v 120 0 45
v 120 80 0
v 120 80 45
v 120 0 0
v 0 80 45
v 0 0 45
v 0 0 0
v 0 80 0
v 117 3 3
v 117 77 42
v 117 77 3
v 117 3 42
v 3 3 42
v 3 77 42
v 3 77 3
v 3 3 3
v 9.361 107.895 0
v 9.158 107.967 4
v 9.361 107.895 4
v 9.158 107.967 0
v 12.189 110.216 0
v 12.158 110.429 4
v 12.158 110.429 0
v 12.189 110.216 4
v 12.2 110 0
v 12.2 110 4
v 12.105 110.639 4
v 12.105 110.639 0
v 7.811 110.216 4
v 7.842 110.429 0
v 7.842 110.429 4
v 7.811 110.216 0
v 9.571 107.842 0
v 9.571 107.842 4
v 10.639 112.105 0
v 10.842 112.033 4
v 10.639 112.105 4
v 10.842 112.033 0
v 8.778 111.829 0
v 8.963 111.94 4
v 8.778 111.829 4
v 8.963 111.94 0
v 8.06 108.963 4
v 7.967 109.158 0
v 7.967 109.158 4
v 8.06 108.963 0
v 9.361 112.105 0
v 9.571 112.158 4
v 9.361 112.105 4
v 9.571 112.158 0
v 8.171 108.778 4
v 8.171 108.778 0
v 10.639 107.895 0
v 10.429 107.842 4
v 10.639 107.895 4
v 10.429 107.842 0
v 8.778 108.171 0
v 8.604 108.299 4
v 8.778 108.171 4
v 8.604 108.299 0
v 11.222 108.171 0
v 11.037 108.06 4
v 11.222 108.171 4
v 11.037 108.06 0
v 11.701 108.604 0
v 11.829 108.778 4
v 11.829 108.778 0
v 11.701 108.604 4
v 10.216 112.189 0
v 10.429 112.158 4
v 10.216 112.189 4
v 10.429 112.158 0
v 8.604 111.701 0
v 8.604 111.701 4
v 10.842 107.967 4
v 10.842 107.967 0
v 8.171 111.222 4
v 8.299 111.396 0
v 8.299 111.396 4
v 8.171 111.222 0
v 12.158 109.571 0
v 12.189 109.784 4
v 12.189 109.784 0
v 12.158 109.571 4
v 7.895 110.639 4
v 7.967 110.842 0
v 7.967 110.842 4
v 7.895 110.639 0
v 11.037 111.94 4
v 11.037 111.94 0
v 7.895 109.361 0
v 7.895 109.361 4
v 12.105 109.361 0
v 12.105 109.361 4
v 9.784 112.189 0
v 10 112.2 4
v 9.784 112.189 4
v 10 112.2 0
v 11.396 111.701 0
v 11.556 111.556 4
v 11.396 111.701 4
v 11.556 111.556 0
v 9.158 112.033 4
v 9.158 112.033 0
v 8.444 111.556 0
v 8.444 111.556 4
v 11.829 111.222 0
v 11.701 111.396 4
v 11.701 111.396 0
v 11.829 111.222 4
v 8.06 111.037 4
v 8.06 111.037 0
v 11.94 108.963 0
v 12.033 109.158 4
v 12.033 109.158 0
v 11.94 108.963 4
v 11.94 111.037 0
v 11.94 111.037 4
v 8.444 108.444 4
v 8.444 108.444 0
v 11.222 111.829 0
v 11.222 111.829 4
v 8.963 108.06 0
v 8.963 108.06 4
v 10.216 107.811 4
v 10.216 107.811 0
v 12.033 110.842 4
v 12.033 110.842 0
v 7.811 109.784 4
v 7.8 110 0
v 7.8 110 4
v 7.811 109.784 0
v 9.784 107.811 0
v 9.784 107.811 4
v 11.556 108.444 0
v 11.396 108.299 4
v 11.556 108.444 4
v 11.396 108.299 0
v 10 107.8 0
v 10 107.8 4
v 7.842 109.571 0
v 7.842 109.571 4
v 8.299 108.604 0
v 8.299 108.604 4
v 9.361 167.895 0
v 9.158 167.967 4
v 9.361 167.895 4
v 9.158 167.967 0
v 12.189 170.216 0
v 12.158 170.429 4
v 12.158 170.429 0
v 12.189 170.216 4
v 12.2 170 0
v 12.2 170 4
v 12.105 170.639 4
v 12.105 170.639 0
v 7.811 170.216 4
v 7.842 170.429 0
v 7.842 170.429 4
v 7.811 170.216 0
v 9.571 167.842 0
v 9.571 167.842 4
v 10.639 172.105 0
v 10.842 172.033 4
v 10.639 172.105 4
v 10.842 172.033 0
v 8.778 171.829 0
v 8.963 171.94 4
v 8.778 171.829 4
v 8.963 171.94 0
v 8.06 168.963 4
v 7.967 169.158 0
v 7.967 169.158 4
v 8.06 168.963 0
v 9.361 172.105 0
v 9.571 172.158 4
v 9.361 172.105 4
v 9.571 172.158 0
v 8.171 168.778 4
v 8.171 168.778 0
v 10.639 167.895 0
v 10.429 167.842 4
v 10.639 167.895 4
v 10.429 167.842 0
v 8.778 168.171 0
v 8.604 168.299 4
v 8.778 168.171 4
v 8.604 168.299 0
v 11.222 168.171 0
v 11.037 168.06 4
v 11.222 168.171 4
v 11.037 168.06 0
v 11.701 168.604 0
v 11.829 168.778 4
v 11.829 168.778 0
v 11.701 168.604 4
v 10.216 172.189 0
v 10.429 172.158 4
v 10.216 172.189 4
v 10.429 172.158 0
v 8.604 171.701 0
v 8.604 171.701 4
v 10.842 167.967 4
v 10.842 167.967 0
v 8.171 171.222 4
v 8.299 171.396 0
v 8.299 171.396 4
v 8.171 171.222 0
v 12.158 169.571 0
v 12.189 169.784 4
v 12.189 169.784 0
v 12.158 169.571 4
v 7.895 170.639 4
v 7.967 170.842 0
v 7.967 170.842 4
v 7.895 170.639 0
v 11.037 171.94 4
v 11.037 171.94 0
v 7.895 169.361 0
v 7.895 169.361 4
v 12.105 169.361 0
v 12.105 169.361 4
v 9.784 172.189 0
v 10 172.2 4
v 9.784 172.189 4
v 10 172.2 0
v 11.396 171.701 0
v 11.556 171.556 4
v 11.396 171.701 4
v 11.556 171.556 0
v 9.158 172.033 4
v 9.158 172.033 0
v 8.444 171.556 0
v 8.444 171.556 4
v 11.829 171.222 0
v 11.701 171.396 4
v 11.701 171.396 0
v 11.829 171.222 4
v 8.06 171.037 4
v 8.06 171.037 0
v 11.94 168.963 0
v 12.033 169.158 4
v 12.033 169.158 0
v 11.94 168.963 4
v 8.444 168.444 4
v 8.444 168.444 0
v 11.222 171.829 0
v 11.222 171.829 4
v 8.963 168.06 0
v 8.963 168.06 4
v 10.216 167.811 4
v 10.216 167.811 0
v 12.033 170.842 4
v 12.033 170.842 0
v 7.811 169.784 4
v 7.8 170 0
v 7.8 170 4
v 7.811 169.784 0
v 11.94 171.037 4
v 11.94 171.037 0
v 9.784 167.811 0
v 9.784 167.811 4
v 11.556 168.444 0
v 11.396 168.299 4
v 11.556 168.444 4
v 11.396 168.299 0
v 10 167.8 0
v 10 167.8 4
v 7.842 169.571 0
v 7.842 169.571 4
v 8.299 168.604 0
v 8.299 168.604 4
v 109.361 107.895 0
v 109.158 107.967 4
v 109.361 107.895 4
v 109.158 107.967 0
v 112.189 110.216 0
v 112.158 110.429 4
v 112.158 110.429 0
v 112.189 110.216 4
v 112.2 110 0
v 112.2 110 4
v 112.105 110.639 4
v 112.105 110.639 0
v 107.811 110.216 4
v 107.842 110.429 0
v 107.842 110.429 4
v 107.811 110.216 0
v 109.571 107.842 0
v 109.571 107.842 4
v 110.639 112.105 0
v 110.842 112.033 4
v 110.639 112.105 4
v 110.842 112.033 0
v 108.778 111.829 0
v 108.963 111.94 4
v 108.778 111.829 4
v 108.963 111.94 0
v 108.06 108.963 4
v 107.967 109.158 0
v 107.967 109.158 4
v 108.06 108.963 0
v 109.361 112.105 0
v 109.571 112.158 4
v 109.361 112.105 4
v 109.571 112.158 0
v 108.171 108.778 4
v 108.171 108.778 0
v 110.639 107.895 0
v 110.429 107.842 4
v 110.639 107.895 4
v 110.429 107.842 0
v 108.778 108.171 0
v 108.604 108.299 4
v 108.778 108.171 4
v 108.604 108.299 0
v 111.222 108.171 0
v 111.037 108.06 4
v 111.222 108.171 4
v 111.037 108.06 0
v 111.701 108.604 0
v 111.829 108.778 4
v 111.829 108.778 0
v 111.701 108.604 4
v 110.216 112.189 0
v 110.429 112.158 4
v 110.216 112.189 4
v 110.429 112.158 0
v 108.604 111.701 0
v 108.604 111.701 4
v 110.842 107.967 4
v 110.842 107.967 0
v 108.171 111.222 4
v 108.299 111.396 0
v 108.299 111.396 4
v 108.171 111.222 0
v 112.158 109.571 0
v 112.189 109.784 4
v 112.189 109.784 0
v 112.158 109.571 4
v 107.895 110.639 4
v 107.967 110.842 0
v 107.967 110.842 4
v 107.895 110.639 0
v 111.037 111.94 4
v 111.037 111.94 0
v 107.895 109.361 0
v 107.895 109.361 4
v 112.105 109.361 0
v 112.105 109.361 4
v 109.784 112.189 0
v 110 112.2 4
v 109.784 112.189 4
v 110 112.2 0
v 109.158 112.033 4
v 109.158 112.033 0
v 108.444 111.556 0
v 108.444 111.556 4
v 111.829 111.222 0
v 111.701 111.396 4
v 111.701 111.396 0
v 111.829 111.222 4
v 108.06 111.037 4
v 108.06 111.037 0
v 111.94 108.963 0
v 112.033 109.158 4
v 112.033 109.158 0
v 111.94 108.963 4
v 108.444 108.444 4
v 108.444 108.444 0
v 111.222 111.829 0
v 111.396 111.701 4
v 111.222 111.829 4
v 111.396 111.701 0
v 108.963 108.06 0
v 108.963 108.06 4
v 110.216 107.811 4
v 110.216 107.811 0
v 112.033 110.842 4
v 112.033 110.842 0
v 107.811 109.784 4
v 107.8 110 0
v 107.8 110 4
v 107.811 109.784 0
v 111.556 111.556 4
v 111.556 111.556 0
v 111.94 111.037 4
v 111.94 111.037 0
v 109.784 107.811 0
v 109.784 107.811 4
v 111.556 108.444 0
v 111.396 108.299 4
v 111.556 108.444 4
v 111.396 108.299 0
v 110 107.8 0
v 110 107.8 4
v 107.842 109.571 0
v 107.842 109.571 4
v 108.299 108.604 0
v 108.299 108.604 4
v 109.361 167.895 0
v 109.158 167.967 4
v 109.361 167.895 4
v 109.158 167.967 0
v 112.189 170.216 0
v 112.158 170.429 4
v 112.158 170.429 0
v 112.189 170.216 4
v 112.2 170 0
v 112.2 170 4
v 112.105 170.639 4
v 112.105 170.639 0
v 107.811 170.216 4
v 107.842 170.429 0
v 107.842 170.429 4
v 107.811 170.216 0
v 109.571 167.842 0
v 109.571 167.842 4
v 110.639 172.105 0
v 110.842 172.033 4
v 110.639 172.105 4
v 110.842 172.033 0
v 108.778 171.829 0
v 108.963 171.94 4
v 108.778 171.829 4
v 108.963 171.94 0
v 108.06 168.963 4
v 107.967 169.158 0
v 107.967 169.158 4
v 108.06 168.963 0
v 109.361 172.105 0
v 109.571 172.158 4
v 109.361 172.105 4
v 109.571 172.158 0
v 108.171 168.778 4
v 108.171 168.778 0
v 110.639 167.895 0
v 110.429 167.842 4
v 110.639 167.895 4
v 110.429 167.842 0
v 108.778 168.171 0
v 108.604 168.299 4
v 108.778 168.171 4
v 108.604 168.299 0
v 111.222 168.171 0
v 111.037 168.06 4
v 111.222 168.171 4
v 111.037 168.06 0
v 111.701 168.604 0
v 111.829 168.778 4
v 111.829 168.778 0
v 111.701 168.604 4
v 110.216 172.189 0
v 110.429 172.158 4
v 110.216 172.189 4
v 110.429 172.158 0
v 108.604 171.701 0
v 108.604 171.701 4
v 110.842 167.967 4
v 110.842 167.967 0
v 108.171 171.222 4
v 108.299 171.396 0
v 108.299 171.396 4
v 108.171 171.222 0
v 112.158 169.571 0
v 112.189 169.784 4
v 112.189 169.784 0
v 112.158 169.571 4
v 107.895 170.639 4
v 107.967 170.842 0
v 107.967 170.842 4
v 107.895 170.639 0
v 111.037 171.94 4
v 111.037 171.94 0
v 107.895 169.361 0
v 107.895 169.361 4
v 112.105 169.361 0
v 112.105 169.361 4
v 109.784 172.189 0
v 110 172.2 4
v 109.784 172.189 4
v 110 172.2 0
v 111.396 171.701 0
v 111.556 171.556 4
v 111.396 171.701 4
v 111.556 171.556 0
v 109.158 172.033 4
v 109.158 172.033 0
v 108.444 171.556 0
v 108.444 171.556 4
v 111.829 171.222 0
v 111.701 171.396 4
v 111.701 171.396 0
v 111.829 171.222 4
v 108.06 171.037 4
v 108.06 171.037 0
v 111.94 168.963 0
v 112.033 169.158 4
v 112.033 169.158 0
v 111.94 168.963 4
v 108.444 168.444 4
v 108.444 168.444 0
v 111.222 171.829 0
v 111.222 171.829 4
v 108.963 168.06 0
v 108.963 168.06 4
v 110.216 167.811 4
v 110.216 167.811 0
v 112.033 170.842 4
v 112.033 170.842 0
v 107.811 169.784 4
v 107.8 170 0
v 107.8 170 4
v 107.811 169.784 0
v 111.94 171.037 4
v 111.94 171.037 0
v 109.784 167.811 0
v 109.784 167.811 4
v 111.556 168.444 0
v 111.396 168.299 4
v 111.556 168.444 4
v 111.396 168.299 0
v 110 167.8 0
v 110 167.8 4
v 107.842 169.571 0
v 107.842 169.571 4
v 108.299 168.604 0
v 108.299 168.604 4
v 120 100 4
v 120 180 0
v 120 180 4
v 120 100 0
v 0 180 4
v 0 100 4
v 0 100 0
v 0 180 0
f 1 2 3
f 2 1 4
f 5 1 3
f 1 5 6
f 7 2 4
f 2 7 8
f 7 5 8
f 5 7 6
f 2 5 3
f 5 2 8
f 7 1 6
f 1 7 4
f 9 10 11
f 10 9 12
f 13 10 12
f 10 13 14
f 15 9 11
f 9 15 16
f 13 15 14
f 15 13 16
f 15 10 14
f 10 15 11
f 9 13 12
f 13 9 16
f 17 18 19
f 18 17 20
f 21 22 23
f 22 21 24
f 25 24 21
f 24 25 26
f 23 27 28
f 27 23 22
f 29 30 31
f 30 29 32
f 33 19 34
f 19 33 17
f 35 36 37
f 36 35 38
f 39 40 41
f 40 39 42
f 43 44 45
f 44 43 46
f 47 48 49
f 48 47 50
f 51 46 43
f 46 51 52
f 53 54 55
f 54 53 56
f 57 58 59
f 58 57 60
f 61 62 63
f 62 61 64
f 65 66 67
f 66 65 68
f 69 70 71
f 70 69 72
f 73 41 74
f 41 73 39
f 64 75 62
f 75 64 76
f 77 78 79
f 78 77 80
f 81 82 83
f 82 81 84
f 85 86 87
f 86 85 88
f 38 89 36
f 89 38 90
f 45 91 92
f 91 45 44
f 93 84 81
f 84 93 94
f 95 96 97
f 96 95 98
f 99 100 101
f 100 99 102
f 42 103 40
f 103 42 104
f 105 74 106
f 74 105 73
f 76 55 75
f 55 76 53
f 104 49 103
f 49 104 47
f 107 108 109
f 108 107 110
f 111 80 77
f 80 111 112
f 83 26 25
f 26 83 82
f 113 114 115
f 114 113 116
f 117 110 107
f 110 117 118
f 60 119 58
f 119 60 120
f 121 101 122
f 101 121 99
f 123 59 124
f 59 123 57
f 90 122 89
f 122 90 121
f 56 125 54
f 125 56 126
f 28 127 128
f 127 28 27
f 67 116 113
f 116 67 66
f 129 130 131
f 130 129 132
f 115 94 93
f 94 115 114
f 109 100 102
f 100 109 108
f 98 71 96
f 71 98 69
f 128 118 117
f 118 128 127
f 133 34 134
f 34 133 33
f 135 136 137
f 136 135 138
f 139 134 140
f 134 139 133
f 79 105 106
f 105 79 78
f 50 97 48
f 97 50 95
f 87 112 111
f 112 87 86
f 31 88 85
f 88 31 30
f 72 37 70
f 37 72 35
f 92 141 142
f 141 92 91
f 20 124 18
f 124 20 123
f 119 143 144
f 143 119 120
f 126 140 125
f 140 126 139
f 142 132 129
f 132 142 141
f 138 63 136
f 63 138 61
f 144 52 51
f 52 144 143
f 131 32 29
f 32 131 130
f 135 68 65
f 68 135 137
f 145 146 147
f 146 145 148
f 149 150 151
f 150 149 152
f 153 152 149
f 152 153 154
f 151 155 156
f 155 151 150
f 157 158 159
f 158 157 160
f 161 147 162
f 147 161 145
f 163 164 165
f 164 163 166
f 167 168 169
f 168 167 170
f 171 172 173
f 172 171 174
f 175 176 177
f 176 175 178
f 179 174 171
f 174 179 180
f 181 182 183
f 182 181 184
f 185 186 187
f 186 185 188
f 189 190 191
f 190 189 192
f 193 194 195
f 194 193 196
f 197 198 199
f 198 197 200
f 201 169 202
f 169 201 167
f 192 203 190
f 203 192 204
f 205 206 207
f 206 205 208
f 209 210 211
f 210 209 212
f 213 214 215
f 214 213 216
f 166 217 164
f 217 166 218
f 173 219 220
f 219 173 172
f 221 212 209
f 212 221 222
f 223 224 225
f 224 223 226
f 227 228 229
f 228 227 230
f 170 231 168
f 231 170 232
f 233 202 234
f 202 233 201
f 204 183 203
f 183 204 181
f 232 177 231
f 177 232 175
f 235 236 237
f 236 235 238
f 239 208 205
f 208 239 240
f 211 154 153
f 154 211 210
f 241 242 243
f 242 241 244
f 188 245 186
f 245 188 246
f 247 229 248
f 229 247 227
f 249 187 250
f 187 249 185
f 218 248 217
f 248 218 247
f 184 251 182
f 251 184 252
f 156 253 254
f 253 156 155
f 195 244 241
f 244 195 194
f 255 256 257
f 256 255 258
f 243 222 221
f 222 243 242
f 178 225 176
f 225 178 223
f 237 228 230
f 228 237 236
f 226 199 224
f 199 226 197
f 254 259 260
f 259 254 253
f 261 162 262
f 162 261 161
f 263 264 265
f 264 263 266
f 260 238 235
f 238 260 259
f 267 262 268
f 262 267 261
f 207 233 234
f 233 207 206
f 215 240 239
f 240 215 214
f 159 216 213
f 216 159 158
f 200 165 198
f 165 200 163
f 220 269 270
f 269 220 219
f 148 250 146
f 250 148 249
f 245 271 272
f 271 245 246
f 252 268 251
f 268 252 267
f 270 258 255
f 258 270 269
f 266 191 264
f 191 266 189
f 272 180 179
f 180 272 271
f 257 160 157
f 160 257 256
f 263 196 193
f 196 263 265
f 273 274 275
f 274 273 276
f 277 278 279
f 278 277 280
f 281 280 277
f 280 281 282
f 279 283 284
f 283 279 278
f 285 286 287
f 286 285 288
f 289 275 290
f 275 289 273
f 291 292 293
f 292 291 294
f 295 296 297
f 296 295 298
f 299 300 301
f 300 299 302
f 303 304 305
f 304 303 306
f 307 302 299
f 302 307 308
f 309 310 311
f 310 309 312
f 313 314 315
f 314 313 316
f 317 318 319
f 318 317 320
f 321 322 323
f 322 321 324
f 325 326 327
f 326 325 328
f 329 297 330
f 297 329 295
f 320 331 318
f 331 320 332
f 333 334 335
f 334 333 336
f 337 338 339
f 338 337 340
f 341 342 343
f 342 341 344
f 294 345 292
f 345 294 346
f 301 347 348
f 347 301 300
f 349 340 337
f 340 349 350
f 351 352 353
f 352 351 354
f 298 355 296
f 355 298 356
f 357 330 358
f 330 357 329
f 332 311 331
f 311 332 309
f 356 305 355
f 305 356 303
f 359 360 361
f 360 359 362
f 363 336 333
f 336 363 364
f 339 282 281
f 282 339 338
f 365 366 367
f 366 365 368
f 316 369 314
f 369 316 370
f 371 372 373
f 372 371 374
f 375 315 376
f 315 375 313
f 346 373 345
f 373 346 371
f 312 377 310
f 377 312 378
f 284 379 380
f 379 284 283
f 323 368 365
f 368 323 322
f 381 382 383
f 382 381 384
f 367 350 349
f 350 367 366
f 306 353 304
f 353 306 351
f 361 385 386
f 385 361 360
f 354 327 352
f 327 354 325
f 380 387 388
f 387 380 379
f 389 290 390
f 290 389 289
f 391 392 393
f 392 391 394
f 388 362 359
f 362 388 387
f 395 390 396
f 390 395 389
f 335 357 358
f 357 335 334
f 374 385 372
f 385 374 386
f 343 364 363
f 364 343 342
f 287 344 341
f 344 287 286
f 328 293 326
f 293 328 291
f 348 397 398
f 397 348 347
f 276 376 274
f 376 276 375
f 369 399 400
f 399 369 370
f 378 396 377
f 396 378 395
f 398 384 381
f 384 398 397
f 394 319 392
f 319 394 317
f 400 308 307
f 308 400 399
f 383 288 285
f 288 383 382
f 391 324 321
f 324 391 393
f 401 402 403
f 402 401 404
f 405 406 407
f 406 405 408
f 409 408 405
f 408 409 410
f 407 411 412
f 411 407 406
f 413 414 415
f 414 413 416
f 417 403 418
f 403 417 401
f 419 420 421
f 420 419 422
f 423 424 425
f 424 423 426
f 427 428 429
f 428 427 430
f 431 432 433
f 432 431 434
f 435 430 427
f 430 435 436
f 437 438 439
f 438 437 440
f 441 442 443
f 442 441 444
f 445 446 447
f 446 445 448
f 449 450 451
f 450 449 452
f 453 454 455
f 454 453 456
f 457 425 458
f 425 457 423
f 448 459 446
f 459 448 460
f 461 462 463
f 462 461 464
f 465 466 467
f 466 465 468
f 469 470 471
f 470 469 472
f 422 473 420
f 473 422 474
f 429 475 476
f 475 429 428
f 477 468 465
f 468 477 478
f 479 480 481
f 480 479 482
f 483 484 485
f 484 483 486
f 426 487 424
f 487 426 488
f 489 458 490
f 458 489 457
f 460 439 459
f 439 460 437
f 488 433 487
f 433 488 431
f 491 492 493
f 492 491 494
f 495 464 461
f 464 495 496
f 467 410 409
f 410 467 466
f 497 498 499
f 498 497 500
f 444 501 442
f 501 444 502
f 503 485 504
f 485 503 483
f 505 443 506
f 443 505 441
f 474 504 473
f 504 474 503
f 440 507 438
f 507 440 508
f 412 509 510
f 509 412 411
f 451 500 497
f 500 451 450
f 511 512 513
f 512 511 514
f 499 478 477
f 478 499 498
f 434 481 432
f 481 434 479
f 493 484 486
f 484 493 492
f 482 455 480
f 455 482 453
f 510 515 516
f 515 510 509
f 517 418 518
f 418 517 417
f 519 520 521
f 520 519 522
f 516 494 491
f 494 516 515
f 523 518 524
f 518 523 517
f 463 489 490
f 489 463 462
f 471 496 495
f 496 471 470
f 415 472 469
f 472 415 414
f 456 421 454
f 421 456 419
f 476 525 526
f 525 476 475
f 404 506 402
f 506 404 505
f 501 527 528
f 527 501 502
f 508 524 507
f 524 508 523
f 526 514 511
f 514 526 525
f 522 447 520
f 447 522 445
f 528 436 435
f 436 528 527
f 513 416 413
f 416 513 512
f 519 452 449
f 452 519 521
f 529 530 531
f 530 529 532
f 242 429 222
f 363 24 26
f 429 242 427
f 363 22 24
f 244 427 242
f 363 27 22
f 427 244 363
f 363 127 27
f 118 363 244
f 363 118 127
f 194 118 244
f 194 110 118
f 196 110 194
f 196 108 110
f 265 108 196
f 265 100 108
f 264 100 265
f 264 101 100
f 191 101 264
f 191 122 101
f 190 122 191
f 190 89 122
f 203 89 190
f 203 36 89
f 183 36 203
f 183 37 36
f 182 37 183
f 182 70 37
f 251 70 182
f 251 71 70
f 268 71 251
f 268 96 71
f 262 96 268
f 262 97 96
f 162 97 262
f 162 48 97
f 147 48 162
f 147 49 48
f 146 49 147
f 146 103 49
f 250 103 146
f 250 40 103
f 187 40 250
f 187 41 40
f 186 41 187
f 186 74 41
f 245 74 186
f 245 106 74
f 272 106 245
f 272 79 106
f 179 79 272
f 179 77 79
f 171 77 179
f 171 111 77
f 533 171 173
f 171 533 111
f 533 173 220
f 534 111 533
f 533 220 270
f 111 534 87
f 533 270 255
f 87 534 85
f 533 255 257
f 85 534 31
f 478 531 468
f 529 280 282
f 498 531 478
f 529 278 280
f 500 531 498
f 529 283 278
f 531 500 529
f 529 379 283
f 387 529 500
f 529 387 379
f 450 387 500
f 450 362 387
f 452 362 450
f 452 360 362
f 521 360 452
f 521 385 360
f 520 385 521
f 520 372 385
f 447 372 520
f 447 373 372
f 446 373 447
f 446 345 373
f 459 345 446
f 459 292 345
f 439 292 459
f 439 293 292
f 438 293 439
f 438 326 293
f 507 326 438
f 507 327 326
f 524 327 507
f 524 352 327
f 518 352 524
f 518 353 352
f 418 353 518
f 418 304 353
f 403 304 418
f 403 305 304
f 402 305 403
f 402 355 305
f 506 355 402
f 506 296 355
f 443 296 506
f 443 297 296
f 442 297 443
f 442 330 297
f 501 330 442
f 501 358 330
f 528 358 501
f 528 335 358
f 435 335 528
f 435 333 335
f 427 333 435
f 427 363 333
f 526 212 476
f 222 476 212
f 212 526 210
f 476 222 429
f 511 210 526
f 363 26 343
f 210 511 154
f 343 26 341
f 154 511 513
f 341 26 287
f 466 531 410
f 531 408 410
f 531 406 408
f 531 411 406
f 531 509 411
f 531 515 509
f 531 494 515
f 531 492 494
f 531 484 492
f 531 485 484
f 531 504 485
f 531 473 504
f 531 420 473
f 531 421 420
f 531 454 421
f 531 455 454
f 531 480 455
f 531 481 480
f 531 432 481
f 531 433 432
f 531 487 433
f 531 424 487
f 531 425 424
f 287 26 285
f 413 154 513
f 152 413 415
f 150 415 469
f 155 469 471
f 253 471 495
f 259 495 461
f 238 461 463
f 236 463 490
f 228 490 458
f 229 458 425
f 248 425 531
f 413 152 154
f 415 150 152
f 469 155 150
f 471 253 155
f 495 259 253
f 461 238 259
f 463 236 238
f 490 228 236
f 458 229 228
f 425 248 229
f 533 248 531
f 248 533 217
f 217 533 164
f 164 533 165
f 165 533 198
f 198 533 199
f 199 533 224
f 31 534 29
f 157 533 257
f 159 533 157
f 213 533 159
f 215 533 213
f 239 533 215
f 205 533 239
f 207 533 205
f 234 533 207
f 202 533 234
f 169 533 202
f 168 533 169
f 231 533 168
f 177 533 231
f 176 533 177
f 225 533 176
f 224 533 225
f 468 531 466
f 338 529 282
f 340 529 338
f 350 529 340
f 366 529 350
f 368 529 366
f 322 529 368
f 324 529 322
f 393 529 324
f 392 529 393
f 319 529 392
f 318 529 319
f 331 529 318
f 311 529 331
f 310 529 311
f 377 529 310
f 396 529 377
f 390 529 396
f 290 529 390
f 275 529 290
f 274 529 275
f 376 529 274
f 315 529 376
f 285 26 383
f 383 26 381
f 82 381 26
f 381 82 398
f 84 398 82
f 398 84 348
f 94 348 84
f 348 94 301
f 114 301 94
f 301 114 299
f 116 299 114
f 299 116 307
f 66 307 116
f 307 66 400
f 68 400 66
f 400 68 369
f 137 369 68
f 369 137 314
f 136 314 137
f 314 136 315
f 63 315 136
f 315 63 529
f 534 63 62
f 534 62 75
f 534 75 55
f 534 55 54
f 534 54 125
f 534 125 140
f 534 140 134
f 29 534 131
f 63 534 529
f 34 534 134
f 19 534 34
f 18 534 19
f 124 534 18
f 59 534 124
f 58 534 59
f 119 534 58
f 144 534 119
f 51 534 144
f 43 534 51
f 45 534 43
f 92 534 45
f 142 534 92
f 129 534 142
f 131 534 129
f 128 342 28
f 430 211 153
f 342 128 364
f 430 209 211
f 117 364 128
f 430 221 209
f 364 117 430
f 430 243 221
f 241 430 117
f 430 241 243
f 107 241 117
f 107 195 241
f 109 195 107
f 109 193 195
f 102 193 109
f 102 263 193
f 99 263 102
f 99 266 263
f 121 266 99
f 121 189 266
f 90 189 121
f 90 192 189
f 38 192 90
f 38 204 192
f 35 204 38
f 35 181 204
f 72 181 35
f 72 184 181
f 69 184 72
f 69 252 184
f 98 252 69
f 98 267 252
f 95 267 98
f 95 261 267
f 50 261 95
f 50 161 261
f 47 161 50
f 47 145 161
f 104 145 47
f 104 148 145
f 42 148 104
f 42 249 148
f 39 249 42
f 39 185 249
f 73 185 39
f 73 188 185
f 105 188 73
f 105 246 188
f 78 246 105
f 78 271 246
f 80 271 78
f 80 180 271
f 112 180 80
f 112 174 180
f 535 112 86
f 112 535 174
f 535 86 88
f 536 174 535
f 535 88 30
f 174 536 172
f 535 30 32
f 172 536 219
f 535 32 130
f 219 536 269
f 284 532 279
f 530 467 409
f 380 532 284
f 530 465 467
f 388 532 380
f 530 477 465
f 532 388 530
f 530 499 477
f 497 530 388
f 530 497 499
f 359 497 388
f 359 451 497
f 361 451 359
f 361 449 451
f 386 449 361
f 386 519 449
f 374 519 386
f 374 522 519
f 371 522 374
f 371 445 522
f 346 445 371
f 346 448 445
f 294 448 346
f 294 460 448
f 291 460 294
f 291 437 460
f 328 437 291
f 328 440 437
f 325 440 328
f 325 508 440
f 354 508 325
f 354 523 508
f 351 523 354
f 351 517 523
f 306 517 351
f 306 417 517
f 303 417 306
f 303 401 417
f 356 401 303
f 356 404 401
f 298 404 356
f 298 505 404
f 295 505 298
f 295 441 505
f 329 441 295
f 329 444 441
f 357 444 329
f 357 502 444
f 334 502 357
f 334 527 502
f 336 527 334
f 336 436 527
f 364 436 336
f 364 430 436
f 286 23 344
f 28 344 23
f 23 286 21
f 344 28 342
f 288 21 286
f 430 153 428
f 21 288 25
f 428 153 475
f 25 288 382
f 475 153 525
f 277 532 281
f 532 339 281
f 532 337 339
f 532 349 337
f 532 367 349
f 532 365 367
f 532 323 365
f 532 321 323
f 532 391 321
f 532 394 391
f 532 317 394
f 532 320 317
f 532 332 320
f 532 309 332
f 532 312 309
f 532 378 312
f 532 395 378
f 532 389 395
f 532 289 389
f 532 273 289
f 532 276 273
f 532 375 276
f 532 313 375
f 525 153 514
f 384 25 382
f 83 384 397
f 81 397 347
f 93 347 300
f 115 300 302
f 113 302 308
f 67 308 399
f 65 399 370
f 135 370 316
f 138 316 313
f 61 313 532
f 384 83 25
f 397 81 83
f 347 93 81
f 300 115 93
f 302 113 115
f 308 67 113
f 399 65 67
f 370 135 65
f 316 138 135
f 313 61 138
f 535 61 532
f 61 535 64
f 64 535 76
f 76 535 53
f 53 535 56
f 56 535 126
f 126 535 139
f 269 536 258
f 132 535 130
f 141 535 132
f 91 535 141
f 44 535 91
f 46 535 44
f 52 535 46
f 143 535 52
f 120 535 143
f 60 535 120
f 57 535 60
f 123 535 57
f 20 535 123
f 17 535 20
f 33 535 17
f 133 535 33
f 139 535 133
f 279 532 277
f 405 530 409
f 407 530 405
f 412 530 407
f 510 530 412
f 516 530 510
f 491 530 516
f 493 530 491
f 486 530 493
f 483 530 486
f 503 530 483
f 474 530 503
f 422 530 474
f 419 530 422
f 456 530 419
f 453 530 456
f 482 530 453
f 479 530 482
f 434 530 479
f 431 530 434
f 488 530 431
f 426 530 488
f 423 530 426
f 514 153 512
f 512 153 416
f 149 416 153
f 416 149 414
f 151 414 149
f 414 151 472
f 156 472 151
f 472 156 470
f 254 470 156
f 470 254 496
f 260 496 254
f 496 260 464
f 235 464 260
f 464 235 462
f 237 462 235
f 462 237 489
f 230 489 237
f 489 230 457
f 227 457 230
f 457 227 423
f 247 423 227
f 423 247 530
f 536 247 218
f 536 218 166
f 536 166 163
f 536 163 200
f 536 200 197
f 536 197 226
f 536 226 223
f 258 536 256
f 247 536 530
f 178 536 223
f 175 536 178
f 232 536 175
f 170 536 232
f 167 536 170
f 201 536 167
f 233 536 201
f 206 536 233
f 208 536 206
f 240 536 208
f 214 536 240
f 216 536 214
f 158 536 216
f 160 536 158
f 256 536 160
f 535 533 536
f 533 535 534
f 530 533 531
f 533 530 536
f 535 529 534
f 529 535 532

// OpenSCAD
// Antenna gear parts template for 200x200x200 printers
// Units: mm

$fn = 64;

module simple_enclosure(body_x=120, body_y=80, body_z=45, wall=3) {
    difference() {
        cube([body_x, body_y, body_z], center=false);
        translate([wall, wall, wall])
            cube([body_x - 2 * wall, body_y - 2 * wall, body_z - 2 * wall], center=false);
    }
}

module mounting_plate(plate_x=120, plate_y=80, plate_t=4, hole_r=2.2) {
    difference() {
        cube([plate_x, plate_y, plate_t], center=false);
        for (x = [10, plate_x - 10])
            for (y = [10, plate_y - 10])
                translate([x, y, -1]) cylinder(h=plate_t + 2, r=hole_r);
    }
}

simple_enclosure();
translate([0, 100, 0]) mounting_plate();
